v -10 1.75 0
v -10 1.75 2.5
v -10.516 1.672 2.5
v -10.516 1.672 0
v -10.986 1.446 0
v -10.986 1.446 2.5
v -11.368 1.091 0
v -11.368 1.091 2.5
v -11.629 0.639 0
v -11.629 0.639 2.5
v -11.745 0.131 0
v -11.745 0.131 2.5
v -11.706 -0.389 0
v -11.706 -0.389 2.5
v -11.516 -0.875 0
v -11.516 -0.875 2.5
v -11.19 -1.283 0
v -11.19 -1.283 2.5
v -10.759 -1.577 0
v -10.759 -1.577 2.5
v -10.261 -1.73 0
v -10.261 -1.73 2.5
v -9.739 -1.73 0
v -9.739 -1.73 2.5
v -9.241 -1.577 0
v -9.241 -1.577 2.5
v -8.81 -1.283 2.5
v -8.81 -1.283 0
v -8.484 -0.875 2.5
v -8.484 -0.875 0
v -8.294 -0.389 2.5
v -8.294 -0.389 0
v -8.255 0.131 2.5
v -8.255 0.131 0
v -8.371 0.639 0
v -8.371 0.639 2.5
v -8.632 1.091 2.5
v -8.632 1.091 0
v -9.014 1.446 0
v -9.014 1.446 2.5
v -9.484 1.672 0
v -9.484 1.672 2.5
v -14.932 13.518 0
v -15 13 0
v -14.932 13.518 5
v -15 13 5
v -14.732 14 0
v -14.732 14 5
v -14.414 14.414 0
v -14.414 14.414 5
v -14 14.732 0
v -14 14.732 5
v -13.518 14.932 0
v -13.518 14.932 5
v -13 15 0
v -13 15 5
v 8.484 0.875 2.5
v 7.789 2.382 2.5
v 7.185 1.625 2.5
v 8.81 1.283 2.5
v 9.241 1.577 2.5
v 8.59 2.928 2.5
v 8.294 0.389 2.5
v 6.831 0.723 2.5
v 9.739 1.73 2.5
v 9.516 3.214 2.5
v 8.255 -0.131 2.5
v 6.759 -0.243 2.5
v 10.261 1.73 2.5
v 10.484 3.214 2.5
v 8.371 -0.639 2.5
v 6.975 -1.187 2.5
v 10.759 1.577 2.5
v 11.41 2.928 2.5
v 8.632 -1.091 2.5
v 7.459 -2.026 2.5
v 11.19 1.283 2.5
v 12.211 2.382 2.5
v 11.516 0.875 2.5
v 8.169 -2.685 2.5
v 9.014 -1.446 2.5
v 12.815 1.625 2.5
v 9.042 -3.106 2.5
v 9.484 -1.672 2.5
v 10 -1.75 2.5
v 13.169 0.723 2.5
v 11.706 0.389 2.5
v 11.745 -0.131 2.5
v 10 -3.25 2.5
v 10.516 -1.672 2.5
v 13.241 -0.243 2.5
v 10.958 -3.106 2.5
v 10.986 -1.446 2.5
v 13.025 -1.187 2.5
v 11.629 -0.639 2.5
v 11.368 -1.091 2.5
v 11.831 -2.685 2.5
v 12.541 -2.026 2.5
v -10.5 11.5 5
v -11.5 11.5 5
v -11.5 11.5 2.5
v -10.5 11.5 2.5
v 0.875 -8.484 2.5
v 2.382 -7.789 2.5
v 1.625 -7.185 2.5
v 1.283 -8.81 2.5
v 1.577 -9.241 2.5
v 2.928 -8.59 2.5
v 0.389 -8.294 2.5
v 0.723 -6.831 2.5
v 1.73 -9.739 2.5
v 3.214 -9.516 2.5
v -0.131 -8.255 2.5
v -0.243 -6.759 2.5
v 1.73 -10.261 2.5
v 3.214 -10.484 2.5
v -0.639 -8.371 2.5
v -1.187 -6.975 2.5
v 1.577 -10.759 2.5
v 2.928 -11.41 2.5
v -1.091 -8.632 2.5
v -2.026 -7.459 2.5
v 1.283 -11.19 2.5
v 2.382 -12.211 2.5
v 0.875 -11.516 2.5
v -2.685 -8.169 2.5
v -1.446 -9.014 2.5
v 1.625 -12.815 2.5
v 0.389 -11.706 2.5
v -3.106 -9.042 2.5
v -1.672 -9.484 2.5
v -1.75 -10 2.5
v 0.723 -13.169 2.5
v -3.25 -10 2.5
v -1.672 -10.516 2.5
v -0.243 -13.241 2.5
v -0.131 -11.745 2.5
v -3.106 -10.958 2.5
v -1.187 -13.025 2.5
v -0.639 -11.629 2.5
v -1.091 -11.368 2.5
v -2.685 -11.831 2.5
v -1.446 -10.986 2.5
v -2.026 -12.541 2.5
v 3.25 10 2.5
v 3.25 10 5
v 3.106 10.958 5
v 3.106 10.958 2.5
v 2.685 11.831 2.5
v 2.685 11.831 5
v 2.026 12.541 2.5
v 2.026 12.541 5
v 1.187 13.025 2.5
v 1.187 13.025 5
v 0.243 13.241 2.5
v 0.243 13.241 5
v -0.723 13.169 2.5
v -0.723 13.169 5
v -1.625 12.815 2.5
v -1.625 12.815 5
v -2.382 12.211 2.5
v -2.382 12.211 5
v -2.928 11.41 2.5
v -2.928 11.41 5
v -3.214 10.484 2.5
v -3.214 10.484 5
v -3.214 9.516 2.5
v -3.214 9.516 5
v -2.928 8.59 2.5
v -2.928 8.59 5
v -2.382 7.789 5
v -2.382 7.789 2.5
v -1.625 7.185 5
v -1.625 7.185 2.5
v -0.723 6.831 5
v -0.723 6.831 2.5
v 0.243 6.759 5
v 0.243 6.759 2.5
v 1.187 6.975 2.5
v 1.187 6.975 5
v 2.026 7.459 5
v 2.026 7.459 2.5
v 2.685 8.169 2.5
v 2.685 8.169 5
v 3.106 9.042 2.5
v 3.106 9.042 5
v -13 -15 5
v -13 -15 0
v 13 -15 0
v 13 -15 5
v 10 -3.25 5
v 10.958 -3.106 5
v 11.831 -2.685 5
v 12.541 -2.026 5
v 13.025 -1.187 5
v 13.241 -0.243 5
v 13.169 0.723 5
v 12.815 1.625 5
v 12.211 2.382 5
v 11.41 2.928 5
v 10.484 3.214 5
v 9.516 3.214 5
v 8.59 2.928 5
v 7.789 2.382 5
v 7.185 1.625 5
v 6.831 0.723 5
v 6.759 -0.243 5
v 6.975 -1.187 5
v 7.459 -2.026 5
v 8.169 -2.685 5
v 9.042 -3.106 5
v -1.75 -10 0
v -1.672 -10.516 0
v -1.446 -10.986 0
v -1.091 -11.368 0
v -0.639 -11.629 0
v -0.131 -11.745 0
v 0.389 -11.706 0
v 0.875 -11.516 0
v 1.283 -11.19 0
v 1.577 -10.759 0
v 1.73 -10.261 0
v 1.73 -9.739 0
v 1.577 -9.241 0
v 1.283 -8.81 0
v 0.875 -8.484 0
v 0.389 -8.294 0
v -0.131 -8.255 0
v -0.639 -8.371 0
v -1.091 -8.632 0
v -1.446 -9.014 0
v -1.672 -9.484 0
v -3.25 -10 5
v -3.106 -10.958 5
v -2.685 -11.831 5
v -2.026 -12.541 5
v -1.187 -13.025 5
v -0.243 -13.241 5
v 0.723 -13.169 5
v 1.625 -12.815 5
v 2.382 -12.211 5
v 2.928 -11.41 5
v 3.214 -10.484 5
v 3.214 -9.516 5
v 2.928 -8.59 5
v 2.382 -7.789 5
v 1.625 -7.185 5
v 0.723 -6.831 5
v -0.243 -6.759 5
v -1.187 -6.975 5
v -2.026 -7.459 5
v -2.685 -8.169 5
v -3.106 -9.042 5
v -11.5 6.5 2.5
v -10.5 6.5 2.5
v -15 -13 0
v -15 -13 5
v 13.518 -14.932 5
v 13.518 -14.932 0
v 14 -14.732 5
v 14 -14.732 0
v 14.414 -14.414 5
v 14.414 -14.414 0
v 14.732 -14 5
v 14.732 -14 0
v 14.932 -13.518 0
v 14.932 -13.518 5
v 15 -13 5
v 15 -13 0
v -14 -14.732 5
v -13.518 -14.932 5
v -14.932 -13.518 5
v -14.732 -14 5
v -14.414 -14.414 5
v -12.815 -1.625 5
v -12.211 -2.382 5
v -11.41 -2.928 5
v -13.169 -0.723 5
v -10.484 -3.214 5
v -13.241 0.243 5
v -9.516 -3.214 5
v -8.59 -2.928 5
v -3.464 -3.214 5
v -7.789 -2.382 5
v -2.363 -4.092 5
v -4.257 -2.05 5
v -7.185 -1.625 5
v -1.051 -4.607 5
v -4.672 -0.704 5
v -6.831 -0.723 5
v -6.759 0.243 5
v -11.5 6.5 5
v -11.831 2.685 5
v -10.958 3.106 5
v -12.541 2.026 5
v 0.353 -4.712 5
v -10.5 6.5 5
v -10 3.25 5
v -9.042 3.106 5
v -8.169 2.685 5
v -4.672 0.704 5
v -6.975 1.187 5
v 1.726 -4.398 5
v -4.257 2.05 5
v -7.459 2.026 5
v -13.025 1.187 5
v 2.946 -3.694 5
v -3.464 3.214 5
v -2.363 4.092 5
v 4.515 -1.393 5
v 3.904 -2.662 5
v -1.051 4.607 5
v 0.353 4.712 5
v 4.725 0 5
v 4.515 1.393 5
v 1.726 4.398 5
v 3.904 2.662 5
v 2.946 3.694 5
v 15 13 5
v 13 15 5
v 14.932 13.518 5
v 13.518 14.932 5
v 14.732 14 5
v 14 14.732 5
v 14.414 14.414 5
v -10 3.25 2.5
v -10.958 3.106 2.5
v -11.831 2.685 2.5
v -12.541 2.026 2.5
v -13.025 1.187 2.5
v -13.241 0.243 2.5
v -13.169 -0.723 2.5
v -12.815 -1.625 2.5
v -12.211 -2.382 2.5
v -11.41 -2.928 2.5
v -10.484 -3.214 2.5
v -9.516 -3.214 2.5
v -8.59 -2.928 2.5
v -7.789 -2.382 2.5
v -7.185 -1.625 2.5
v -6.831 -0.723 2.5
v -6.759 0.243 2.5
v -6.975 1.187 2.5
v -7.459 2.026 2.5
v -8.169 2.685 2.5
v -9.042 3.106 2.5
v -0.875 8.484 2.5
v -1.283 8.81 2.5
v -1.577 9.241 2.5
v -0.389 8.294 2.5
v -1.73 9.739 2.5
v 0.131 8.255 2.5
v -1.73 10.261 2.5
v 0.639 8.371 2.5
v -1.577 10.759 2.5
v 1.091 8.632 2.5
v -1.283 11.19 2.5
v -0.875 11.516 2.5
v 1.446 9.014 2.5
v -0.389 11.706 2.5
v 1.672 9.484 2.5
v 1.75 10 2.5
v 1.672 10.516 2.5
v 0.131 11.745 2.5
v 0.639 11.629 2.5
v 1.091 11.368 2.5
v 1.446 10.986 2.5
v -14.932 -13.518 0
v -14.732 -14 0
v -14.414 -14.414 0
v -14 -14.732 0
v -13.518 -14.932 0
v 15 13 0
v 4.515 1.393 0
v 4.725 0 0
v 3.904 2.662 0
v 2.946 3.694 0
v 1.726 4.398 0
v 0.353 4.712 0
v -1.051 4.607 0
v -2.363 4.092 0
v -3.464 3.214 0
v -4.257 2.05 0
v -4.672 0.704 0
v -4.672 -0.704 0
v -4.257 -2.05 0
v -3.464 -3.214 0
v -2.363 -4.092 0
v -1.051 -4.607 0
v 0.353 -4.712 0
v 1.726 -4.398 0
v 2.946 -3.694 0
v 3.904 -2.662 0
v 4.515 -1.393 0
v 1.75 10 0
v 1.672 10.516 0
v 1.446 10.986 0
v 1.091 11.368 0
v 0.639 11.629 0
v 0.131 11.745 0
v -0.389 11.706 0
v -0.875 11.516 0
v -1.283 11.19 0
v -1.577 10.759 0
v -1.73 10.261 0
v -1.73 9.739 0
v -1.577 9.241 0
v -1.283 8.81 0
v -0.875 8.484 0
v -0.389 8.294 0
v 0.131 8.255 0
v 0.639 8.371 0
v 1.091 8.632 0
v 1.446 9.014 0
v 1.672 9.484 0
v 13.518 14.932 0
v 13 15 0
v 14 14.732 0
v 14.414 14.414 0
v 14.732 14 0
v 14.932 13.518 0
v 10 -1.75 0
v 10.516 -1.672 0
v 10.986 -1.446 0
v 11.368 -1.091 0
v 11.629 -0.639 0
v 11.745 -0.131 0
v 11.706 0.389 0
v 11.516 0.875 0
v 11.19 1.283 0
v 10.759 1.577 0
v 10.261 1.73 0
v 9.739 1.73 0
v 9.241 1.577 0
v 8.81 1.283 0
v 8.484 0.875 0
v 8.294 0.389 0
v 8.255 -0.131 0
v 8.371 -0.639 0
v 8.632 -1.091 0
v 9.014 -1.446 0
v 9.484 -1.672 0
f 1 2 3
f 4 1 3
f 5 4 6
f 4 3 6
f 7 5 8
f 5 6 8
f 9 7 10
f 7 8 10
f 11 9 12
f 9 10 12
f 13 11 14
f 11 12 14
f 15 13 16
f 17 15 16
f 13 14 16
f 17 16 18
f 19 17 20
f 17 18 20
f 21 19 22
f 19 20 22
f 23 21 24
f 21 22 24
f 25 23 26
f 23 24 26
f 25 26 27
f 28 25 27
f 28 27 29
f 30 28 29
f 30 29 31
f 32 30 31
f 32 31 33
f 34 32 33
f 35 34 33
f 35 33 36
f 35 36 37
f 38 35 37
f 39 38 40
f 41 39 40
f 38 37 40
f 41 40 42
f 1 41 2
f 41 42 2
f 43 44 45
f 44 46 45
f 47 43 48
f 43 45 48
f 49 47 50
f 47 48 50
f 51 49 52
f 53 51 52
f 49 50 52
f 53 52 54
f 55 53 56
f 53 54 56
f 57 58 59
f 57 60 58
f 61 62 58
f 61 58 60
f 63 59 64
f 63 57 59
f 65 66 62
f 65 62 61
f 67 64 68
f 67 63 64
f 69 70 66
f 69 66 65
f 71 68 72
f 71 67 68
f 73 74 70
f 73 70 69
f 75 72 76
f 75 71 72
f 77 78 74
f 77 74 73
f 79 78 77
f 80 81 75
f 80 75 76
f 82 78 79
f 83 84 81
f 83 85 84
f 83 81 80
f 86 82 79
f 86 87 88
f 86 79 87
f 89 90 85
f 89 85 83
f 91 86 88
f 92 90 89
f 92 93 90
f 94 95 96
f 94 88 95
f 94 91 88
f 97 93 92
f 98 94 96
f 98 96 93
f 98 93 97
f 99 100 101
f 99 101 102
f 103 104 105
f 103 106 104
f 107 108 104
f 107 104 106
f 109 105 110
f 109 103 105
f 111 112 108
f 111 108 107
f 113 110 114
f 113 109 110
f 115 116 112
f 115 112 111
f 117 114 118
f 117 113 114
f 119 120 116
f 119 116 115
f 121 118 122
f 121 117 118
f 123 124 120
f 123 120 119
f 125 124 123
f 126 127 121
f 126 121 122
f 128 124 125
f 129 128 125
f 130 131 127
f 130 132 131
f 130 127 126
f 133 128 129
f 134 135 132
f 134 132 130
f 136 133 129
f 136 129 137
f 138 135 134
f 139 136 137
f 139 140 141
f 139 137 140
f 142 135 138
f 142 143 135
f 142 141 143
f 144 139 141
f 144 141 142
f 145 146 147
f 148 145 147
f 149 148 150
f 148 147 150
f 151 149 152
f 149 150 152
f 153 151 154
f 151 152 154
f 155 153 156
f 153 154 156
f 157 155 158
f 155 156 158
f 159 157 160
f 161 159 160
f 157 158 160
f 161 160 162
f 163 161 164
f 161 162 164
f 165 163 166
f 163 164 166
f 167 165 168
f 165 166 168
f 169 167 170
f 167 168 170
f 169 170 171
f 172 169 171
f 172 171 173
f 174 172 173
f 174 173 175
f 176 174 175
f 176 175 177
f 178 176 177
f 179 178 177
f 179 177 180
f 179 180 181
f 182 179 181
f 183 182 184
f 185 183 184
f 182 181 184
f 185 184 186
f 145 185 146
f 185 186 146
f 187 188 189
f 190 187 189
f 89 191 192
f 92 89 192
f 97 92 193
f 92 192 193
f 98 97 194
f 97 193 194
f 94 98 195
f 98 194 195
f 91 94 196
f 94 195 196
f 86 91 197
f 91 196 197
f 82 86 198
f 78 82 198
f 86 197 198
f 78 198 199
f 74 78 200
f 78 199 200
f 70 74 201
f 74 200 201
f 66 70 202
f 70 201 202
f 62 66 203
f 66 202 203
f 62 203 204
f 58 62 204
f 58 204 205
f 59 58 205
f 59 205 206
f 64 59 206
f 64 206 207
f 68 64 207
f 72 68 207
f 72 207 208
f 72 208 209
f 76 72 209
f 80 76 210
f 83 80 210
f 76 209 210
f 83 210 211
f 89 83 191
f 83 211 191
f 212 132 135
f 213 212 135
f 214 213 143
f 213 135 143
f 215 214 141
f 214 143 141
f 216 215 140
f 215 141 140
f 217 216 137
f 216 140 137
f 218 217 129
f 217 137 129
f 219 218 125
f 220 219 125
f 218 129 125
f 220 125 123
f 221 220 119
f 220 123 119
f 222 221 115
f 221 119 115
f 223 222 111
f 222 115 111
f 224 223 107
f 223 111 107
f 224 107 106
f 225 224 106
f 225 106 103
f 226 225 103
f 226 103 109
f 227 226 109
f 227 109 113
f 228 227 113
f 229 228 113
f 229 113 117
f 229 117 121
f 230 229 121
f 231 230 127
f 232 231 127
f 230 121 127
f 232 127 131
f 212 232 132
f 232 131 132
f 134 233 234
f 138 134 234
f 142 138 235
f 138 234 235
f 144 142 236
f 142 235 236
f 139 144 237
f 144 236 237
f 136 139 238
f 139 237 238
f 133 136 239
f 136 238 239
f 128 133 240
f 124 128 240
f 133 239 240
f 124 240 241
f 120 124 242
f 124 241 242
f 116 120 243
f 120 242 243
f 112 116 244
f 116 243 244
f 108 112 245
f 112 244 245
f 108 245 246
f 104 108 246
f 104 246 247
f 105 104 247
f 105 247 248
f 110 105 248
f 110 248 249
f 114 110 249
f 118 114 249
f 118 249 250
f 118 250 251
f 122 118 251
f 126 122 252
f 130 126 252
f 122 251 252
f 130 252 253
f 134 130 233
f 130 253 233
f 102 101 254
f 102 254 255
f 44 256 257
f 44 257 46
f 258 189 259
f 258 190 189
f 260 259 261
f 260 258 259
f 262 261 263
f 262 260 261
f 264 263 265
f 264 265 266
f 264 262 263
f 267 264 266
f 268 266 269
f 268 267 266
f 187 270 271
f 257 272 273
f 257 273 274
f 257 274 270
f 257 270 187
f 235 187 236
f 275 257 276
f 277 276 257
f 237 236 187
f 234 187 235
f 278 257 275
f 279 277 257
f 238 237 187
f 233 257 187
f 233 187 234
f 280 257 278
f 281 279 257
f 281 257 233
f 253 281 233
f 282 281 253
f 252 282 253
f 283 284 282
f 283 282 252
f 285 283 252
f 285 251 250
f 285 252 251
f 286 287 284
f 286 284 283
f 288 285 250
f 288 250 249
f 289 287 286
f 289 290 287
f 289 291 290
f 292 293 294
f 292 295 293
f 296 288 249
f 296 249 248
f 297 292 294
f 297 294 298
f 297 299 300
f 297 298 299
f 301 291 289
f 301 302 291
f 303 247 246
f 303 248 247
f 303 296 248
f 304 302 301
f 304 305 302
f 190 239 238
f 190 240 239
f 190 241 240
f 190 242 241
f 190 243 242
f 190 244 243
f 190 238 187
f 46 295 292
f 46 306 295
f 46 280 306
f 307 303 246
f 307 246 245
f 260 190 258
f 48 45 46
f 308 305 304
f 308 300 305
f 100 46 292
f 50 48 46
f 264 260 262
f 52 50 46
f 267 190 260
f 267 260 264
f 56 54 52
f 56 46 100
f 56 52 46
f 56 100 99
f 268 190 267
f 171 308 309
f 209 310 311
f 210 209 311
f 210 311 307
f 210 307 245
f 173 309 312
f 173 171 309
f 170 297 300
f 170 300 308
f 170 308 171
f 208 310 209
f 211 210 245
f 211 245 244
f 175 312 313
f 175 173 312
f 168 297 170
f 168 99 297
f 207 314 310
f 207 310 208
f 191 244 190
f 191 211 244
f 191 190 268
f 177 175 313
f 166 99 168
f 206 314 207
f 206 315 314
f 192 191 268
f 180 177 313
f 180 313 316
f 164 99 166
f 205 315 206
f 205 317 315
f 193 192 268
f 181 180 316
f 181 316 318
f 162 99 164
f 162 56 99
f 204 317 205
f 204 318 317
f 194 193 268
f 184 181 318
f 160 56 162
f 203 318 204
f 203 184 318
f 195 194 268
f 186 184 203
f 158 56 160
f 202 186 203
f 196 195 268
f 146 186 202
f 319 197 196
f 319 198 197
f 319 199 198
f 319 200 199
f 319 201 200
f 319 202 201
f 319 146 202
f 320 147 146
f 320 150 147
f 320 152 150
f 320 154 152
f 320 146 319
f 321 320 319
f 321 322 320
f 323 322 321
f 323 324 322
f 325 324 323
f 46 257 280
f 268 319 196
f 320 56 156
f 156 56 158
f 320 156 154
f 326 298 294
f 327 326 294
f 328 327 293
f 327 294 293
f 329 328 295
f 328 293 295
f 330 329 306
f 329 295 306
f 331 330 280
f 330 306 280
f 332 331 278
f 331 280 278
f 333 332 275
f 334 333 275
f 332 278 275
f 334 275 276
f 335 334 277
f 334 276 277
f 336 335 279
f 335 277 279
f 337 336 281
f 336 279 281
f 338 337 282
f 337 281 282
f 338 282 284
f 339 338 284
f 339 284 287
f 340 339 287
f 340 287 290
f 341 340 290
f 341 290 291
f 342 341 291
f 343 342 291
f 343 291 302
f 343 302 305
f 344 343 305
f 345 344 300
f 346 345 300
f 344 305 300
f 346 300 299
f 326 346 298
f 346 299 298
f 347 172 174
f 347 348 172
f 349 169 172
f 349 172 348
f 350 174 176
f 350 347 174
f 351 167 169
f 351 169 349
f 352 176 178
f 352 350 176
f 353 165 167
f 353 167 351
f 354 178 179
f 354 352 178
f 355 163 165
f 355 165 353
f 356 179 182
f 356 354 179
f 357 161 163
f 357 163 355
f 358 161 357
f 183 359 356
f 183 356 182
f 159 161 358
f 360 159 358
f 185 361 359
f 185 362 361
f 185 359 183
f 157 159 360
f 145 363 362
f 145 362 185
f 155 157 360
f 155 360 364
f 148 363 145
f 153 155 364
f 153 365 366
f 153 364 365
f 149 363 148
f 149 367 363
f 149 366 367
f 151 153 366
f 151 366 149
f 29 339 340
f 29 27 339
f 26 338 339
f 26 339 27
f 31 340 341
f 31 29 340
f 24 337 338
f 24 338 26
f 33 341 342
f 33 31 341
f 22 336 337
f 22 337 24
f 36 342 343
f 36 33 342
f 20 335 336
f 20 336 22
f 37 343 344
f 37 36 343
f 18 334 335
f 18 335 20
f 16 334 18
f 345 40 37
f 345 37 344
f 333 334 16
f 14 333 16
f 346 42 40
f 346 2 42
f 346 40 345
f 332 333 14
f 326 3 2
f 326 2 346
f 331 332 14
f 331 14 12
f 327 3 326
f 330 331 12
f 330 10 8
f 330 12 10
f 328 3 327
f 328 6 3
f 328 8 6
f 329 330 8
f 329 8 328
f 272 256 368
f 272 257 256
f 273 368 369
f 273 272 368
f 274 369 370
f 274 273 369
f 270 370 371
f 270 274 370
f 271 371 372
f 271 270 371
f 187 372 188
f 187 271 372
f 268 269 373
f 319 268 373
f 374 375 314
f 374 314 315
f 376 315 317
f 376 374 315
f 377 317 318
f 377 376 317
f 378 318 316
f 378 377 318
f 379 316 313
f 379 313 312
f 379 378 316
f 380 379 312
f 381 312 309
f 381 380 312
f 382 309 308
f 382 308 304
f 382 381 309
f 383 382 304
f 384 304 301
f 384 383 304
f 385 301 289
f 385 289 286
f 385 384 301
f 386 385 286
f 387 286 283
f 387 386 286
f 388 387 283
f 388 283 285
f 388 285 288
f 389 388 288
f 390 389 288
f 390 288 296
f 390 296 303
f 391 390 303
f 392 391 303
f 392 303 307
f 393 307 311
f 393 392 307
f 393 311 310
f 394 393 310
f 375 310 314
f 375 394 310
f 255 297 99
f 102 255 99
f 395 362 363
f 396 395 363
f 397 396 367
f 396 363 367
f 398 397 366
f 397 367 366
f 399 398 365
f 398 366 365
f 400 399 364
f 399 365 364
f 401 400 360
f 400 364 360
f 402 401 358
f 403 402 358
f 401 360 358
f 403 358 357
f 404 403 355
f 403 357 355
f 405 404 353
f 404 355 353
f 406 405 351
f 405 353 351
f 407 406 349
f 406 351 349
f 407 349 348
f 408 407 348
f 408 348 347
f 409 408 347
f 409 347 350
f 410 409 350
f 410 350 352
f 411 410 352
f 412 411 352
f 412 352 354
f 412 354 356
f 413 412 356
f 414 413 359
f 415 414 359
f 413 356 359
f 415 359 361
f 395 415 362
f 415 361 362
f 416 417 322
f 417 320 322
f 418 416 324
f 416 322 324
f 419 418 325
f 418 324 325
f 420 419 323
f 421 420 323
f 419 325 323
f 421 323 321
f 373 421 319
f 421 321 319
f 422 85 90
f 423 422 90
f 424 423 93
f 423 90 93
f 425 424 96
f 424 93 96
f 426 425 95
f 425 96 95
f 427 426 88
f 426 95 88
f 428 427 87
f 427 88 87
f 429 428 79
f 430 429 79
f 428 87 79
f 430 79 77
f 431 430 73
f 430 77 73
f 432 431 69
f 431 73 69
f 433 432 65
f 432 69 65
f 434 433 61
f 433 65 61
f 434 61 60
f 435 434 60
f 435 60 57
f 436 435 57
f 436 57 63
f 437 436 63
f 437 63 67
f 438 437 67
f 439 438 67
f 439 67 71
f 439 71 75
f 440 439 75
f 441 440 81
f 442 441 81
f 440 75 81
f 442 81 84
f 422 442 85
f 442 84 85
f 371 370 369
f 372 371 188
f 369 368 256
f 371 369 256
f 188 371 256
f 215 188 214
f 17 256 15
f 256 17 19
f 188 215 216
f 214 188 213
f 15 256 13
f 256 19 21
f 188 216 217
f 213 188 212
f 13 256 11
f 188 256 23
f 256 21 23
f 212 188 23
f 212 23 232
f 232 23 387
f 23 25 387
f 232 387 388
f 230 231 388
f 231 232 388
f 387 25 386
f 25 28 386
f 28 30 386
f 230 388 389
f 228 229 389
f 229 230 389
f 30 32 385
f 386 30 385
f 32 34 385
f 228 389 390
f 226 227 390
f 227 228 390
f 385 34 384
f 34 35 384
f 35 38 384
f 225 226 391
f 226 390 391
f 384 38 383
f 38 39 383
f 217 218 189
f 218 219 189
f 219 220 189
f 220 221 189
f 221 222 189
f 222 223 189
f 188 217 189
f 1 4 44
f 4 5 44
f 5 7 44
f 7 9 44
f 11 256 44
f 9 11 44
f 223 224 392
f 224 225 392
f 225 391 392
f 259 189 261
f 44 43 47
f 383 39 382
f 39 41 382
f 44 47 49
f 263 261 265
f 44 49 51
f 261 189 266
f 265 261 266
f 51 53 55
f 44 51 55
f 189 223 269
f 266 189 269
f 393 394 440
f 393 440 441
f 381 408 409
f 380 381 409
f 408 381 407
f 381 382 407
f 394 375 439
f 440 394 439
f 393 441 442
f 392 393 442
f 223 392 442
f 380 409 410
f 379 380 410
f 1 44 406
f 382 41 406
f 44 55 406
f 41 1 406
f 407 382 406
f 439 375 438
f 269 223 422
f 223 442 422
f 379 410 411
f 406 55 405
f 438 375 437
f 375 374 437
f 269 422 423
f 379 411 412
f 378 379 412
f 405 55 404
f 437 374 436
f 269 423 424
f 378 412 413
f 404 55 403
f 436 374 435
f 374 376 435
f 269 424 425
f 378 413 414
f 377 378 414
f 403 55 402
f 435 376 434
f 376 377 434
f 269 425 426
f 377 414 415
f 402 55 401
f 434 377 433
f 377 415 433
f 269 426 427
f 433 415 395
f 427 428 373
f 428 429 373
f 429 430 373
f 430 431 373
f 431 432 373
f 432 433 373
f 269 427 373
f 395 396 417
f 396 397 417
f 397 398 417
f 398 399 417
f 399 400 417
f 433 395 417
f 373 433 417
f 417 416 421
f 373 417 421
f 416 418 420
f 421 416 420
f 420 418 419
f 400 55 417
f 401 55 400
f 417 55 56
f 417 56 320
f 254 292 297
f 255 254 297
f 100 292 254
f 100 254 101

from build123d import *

# Parameters (mm, degrees)
SKETCH1_W           = 30
SKETCH1_H           = 30
SKETCH1_R           = 4.725
BOSS_EXTRUDE1_DEPTH = 5
FILLET1_R           = 2
SKETCH2_R           = 1.75
CUT_EXTRUDE1_DEPTH  = 22.794494718
CIRPATTERN1_COUNT   = 4
SKETCH3_R           = 3.25
CUT_EXTRUDE2_DEPTH  = 2.5
CIRPATTERN2_COUNT   = 4
SKETCH4_W           = 1
SKETCH4_H           = 5
CUT_EXTRUDE3_DEPTH  = 2.5


with BuildPart() as part:
    # Sketch1 → Boss-Extrude1 (new body)
    with BuildSketch(Plane.XY):
        Rectangle(SKETCH1_W, SKETCH1_H)
        Circle(SKETCH1_R, mode=Mode.SUBTRACT)
    extrude(amount=BOSS_EXTRUDE1_DEPTH)

    # Fillet1
    fillet1_edges = [part.edges().sort_by_distance(p)[0] for p in [
        (-15, 15, 2.5),
        (15, 15, 2.5),
        (15, -15, 2.5),
        (-15, -15, 2.5),
    ]]
    fillet(fillet1_edges, radius=FILLET1_R)

    # Sketch2 → Cut-Extrude1 (cut, symmetric)
    with BuildSketch(Plane.XY):
        with Locations((0, 10)):
            Circle(SKETCH2_R)
    cut_extrude1 = extrude(amount=CUT_EXTRUDE1_DEPTH, both=True, mode=Mode.SUBTRACT)

    # CirPattern1: Cut-Extrude1 ×4 about axis
    cirpattern1_axis = Axis((0, 0, 0), (0, 0, 1))
    for i in range(1, CIRPATTERN1_COUNT):
        add(cut_extrude1.rotate(cirpattern1_axis, i * 360 / CIRPATTERN1_COUNT), mode=Mode.SUBTRACT)

    # Sketch3 → Cut-Extrude2 (cut)
    with BuildSketch(Plane.XY.offset(5)):
        with Locations((0, 10)):
            Circle(SKETCH3_R)
    cut_extrude2 = extrude(amount=-CUT_EXTRUDE2_DEPTH, mode=Mode.SUBTRACT)

    # CirPattern2: Cut-Extrude2 ×4 about axis
    cirpattern2_axis = Axis((0, 0, 0), (0, 0, 1))
    for i in range(1, CIRPATTERN2_COUNT):
        add(cut_extrude2.rotate(cirpattern2_axis, i * 360 / CIRPATTERN2_COUNT), mode=Mode.SUBTRACT)

    # Sketch4 → Cut-Extrude3 (cut)
    with BuildSketch(Plane.XY.offset(5)):
        with Locations((-11, 9)):
            Rectangle(SKETCH4_W, SKETCH4_H)
    extrude(amount=-CUT_EXTRUDE3_DEPTH, mode=Mode.SUBTRACT)


solid = part.part
